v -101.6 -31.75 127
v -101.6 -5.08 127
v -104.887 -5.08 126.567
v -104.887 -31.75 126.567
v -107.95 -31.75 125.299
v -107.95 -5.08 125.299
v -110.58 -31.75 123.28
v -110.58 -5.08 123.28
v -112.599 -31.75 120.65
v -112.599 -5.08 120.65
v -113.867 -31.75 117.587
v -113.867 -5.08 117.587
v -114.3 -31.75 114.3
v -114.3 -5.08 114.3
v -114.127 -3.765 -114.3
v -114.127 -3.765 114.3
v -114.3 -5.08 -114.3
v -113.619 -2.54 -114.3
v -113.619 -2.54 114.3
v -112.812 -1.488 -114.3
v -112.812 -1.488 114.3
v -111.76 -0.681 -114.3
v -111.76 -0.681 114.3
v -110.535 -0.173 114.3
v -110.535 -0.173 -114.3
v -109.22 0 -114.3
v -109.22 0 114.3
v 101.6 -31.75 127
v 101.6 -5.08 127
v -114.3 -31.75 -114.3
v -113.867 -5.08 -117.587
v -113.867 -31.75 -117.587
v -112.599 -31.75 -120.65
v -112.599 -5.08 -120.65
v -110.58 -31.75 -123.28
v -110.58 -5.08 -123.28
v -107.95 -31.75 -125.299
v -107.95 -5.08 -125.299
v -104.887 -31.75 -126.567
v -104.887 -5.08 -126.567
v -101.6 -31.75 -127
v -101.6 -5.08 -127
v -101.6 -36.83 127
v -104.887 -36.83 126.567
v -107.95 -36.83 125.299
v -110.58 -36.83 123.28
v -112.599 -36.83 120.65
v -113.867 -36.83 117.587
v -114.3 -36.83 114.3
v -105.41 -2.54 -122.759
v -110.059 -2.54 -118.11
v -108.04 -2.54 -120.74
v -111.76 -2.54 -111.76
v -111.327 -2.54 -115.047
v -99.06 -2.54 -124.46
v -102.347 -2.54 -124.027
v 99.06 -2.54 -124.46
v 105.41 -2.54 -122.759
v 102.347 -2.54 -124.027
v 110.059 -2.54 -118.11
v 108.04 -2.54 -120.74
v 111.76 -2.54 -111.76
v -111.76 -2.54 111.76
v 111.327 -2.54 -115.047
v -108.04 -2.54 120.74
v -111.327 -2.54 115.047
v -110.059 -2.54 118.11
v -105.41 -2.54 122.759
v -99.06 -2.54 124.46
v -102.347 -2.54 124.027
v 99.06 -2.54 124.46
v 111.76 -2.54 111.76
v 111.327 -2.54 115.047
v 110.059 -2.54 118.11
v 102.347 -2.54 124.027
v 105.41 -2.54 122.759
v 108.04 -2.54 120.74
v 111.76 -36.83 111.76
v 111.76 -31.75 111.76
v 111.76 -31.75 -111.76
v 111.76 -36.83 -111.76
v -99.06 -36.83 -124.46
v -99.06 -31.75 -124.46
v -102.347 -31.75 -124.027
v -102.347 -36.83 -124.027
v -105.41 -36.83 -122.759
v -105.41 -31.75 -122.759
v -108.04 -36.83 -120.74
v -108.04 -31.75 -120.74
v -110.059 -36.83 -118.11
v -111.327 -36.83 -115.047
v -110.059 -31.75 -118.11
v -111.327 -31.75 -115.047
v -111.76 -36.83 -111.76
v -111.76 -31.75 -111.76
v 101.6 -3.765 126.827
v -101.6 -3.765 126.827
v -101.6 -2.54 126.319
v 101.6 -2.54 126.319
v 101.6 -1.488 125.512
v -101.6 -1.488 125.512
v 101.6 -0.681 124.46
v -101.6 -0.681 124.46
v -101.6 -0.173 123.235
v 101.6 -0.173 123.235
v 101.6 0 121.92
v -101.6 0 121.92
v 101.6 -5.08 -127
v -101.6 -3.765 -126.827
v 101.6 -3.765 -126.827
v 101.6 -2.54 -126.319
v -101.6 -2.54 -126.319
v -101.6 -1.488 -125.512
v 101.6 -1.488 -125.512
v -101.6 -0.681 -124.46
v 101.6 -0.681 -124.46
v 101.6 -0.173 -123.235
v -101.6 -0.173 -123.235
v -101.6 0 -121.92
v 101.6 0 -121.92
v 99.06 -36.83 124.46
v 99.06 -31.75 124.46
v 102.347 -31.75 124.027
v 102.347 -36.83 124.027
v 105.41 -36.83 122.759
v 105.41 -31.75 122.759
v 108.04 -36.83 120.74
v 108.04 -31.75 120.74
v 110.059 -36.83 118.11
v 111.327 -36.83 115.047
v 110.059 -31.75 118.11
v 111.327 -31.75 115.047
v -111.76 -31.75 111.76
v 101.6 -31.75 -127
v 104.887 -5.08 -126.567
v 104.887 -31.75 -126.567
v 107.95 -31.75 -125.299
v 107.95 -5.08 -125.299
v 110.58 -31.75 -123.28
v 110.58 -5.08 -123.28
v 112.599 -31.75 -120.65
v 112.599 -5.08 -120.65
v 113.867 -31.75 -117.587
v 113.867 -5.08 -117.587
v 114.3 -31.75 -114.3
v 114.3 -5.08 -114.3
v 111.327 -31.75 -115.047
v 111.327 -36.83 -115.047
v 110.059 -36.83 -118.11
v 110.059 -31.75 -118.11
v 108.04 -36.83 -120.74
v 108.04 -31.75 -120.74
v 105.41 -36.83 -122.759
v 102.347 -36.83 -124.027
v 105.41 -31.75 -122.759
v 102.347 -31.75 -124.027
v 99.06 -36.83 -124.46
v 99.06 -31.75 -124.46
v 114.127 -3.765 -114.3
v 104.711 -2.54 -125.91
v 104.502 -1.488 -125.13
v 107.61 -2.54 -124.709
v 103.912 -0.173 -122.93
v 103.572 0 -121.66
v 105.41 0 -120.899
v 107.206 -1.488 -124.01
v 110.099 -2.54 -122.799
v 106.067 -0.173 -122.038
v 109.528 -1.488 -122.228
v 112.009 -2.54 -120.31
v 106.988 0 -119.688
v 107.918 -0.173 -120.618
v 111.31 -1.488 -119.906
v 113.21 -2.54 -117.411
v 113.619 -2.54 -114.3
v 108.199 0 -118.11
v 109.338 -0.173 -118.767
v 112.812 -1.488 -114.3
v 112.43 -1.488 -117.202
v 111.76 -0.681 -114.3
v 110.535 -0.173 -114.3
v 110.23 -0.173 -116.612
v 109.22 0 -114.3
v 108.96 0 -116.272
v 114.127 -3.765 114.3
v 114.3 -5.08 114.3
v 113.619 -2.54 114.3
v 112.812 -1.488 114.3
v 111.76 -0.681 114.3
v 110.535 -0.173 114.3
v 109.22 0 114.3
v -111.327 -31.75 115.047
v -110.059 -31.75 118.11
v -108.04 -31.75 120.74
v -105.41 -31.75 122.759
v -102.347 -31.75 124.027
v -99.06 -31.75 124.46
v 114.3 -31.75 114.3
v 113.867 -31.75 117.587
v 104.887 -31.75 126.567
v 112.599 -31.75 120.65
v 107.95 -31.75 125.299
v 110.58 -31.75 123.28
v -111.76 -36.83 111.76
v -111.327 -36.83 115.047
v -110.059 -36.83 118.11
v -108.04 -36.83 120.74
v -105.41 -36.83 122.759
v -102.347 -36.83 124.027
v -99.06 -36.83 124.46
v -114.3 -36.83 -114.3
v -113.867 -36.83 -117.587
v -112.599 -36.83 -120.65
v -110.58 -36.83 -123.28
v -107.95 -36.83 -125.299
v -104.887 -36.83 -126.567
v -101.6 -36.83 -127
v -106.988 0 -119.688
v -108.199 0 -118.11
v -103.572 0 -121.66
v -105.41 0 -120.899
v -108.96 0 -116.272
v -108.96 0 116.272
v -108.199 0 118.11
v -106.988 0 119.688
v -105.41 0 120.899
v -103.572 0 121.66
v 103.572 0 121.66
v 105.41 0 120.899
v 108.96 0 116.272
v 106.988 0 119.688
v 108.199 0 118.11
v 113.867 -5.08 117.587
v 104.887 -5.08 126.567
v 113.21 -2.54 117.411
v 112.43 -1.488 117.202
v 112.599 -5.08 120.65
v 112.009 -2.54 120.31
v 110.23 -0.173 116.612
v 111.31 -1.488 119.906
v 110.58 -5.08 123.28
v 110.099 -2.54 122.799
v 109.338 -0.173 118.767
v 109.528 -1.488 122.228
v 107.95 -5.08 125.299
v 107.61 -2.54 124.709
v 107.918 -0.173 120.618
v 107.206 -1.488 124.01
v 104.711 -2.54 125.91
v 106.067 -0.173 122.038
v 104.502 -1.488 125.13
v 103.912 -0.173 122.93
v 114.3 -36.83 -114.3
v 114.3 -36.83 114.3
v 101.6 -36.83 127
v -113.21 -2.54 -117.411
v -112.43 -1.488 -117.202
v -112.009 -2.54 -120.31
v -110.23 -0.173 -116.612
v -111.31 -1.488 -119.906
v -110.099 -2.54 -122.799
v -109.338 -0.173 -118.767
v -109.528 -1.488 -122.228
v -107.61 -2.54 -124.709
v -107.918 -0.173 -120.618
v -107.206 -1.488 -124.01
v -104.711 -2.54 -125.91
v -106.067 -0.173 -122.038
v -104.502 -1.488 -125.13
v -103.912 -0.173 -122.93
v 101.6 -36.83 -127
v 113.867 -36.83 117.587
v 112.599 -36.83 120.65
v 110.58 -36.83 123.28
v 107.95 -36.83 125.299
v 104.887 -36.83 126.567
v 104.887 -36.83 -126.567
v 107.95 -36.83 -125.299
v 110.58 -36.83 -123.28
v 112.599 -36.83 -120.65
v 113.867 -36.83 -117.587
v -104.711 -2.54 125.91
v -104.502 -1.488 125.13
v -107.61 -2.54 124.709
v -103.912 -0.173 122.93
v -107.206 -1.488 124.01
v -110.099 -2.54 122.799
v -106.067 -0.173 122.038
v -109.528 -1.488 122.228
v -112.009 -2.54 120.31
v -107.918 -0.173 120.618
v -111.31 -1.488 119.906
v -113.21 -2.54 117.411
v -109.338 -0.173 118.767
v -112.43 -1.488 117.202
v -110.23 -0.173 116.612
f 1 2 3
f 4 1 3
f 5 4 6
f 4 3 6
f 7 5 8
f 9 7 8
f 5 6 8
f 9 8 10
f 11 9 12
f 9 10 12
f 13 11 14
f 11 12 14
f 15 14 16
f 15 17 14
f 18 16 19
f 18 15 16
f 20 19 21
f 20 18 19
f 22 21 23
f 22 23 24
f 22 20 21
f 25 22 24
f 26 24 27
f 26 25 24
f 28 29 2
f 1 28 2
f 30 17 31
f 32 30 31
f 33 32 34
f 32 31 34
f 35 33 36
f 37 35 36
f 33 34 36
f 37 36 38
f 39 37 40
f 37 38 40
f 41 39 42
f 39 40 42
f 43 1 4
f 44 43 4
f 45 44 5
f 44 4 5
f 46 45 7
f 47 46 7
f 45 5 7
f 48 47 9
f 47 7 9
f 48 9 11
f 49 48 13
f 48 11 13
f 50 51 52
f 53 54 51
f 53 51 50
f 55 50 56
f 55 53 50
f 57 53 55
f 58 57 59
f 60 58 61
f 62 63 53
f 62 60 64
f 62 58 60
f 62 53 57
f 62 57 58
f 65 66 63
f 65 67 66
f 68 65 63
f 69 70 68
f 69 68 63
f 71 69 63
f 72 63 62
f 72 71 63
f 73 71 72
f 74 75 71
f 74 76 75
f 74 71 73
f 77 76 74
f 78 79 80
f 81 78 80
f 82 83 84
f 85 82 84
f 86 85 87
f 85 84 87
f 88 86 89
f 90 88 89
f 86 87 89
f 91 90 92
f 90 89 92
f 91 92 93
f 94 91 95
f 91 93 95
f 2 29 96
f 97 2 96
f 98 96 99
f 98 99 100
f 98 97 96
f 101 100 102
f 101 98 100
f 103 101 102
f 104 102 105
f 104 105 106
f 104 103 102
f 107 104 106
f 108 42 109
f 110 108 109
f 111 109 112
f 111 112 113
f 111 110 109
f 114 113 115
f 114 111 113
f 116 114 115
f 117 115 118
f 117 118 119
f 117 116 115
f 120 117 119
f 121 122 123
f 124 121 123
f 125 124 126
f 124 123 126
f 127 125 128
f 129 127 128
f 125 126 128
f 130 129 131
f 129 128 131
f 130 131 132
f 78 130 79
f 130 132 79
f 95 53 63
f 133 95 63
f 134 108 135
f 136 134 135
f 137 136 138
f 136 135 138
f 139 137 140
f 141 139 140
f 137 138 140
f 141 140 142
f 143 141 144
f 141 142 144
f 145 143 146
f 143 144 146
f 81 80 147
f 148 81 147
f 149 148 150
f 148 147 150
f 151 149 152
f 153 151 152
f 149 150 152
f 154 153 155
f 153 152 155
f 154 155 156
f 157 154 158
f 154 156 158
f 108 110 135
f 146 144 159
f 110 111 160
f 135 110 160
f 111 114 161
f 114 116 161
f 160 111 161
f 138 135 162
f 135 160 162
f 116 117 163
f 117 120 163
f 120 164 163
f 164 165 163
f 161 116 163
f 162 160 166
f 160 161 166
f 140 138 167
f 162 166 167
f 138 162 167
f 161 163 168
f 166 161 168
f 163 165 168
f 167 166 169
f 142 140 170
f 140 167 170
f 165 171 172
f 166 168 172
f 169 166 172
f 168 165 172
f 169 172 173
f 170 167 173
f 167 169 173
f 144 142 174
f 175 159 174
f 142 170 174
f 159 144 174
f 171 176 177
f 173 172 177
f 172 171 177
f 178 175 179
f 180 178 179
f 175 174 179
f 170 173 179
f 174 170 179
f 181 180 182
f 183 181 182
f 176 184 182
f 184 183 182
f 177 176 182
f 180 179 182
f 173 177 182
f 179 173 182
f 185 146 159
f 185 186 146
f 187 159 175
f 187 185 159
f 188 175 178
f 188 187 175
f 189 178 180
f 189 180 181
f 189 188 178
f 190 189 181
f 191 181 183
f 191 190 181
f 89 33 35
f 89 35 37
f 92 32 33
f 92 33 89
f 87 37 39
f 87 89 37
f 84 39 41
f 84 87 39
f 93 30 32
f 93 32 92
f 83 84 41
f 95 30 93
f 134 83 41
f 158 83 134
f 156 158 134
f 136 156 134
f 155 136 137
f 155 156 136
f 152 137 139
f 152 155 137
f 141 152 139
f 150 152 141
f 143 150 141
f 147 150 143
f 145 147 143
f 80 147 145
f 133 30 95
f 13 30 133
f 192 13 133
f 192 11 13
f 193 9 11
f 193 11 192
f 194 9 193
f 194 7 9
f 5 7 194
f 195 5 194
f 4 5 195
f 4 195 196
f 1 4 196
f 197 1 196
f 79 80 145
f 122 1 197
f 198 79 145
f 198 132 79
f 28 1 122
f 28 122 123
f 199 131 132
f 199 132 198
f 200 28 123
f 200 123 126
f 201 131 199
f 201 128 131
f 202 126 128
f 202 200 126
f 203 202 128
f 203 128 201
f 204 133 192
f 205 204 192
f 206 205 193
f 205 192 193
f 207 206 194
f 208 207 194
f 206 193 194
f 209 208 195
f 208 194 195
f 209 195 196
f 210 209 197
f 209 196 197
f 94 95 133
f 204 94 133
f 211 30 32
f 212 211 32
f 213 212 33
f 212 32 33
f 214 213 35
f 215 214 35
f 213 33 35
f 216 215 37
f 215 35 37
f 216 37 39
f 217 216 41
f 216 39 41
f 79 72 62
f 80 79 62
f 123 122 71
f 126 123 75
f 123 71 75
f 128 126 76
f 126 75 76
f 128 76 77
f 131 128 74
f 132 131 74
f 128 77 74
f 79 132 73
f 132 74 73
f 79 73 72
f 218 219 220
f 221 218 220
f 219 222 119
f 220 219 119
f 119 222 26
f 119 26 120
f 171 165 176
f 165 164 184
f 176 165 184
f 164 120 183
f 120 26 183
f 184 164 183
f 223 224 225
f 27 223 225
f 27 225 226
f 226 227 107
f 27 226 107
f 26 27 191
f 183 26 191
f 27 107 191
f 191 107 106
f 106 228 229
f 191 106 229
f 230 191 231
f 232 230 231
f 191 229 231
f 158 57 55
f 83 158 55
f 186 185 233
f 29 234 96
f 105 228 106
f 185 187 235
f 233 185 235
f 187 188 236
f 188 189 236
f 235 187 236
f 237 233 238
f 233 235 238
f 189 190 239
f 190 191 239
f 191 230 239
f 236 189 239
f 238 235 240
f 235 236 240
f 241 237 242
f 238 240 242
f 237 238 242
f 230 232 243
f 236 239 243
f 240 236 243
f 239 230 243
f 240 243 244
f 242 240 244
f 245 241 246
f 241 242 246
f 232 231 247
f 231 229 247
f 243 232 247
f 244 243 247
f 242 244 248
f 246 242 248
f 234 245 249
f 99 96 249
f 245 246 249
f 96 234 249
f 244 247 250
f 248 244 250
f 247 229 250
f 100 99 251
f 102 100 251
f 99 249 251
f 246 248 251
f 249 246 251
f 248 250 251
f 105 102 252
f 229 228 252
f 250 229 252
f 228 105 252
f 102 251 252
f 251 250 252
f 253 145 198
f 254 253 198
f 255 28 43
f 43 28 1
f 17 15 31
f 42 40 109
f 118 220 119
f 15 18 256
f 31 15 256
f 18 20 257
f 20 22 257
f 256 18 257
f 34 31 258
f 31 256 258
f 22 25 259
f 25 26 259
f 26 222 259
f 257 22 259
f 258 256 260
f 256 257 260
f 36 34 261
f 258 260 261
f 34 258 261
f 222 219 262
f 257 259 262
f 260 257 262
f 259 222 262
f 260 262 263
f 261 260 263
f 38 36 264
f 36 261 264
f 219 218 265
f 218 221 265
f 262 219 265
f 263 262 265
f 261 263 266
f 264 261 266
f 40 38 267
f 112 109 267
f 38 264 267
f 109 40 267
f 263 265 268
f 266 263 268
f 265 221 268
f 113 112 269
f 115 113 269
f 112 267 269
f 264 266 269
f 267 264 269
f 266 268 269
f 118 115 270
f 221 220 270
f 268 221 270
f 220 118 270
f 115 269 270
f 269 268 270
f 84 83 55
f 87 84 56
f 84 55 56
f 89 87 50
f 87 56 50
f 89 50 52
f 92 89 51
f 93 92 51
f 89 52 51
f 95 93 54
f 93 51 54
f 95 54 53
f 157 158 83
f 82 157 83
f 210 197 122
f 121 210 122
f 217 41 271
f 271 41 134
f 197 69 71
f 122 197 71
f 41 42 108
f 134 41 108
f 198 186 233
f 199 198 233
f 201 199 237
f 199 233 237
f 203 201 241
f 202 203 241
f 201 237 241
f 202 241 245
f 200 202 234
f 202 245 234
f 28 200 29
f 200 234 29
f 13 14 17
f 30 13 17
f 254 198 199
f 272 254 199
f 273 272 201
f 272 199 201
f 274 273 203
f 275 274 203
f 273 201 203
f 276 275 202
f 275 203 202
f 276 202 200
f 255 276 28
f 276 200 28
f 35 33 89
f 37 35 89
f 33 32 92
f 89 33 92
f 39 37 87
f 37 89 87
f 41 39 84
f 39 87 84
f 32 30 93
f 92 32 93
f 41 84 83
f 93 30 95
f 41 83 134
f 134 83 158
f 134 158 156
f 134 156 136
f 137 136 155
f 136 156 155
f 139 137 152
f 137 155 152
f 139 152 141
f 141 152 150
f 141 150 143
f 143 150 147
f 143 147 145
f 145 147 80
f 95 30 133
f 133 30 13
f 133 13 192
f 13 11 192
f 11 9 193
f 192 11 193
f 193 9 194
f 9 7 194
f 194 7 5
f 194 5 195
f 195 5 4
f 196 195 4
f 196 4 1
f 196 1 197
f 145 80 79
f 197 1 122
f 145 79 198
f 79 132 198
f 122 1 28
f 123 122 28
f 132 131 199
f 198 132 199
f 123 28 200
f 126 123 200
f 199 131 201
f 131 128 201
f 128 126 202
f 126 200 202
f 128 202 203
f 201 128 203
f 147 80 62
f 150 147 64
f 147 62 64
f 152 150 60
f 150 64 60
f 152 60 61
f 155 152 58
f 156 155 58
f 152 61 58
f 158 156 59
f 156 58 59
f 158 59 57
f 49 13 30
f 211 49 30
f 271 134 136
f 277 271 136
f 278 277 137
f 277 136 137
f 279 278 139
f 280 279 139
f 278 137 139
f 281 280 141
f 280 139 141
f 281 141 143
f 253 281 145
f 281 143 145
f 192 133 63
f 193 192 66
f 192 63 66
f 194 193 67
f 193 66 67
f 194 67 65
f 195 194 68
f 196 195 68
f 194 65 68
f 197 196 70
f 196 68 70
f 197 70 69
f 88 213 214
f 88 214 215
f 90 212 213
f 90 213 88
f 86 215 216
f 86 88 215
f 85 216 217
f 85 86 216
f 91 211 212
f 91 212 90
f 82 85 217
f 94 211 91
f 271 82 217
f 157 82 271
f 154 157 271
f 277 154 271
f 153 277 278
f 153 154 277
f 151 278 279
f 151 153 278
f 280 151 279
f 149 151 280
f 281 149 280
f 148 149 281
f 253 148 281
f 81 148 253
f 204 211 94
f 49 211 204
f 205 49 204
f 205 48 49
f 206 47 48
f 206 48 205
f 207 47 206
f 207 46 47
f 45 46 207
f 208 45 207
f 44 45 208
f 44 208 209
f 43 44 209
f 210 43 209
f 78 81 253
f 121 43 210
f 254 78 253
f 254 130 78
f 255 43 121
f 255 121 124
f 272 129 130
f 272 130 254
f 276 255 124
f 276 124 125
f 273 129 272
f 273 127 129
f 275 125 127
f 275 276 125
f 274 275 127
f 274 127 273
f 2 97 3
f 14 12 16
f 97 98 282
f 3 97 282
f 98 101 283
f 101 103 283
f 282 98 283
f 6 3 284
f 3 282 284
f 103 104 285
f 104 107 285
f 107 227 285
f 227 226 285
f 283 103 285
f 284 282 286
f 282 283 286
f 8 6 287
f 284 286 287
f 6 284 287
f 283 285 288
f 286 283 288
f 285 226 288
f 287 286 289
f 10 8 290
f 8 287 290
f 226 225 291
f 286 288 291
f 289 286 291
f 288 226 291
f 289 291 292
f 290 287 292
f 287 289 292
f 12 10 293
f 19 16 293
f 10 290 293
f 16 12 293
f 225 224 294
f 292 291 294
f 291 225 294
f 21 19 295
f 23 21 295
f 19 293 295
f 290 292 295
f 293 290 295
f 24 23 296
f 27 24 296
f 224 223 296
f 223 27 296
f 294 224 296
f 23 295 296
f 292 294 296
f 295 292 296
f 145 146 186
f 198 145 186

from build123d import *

# Parameters (mm, degrees)
F1_DEPTH = 31.75
F3_DEPTH = 2.54
F5_DEPTH = 5.08
F6_R     = 5.08


with BuildPart() as f1:
    # F0 (on Front) → F1 (new body)
    with BuildSketch(Plane.XZ):
        with BuildLine():
            Line((-101.6, -127), (101.6, -127))
            ThreePointArc((101.6, -127), (110.580256, -123.280256), (114.3, -114.3))
            Line((114.3, -114.3), (114.3, 114.3))
            ThreePointArc((114.3, 114.3), (110.580256, 123.280256), (101.6, 127))
            Line((101.6, 127), (-101.6, 127))
            ThreePointArc((-101.6, 127), (-110.580256, 123.280256), (-114.3, 114.3))
            Line((-114.3, 114.3), (-114.3, -114.3))
            ThreePointArc((-114.3, -114.3), (-110.580256, -123.280256), (-101.6, -127))
        make_face()
        with BuildLine():
            ThreePointArc((111.76, -111.76), (108.040256, -120.740256), (99.06, -124.46))
            Line((99.06, -124.46), (-99.06, -124.46))
            ThreePointArc((-99.06, -124.46), (-108.040256, -120.740256), (-111.76, -111.76))
            Line((-111.76, -111.76), (-111.76, 111.76))
            ThreePointArc((-111.76, 111.76), (-108.040256, 120.740256), (-99.06, 124.46))
            Line((-99.06, 124.46), (99.06, 124.46))
            ThreePointArc((99.06, 124.46), (108.040256, 120.740256), (111.76, 111.76))
            Line((111.76, 111.76), (111.76, -111.76))
        make_face(mode=Mode.SUBTRACT)
    extrude(amount=F1_DEPTH)

    # F2 (on Front) → F3 (join)
    with BuildSketch(Plane.XZ):
        with BuildLine():
            ThreePointArc((-114.3, -114.3), (-110.580256, -123.280256), (-101.6, -127))
            Line((-101.6, -127), (101.6, -127))
            ThreePointArc((101.6, -127), (110.580256, -123.280256), (114.3, -114.3))
            Line((114.3, -114.3), (114.3, 114.3))
            ThreePointArc((114.3, 114.3), (110.580256, 123.280256), (101.6, 127))
            Line((101.6, 127), (-101.6, 127))
            ThreePointArc((-101.6, 127), (-110.580256, 123.280256), (-114.3, 114.3))
            Line((-114.3, 114.3), (-114.3, -114.3))
        make_face()
    extrude(amount=F3_DEPTH)

    # F6
    f6_edges = [f1.edges().sort_by_distance(p)[0] for p in [
        (0, 0, -127),
        (110.580256, 0, -123.280256),
        (114.3, 0, 0),
        (110.580256, 0, 123.280256),
        (0, 0, 127),
        (-110.580256, 0, 123.280256),
        (-114.3, 0, 0),
        (-110.580256, 0, -123.280256),
    ]]
    fillet(f6_edges, radius=F6_R)


with BuildPart() as f5:
    # F4 (on face) → F5 (new body)
    with BuildSketch(Plane.XZ.offset(31.75)):
        with BuildLine():
            Line((-101.6, -127), (101.6, -127))
            ThreePointArc((101.6, -127), (110.580256, -123.280256), (114.3, -114.3))
            Line((114.3, -114.3), (114.3, 114.3))
            ThreePointArc((114.3, 114.3), (110.580256, 123.280256), (101.6, 127))
            Line((101.6, 127), (-101.6, 127))
            ThreePointArc((-101.6, 127), (-110.580256, 123.280256), (-114.3, 114.3))
            Line((-114.3, 114.3), (-114.3, -114.3))
            ThreePointArc((-114.3, -114.3), (-110.580256, -123.280256), (-101.6, -127))
        make_face()
        with BuildLine():
            ThreePointArc((111.76, -111.76), (108.040256, -120.740256), (99.06, -124.46))
            Line((99.06, -124.46), (-99.06, -124.46))
            ThreePointArc((-99.06, -124.46), (-108.040256, -120.740256), (-111.76, -111.76))
            Line((-111.76, -111.76), (-111.76, 111.76))
            ThreePointArc((-111.76, 111.76), (-108.040256, 120.740256), (-99.06, 124.46))
            Line((-99.06, 124.46), (99.06, 124.46))
            ThreePointArc((99.06, 124.46), (108.040256, 120.740256), (111.76, 111.76))
            Line((111.76, 111.76), (111.76, -111.76))
        make_face(mode=Mode.SUBTRACT)
    extrude(amount=F5_DEPTH)


solid = Compound([f1.part, f5.part])
